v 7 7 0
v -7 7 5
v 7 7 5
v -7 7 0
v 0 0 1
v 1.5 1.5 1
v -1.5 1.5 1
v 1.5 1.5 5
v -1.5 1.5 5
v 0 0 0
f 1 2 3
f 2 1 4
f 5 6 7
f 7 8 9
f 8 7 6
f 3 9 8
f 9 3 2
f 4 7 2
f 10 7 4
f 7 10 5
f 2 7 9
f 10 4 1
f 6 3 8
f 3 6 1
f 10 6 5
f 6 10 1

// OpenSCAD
difference(){
	union(){ 

        translate([0,0,0]){
            rotate([0,0,45]){
                cube([10,10,5], center=false);
            }
        }  

            
	}
	union() {
        translate([-21,7,-1]){
           cube([45,20,12], center=false);
        }                
        translate([-10,0,1]){
           cube([20,1.5,10], center=false);
        }                

	}
}
